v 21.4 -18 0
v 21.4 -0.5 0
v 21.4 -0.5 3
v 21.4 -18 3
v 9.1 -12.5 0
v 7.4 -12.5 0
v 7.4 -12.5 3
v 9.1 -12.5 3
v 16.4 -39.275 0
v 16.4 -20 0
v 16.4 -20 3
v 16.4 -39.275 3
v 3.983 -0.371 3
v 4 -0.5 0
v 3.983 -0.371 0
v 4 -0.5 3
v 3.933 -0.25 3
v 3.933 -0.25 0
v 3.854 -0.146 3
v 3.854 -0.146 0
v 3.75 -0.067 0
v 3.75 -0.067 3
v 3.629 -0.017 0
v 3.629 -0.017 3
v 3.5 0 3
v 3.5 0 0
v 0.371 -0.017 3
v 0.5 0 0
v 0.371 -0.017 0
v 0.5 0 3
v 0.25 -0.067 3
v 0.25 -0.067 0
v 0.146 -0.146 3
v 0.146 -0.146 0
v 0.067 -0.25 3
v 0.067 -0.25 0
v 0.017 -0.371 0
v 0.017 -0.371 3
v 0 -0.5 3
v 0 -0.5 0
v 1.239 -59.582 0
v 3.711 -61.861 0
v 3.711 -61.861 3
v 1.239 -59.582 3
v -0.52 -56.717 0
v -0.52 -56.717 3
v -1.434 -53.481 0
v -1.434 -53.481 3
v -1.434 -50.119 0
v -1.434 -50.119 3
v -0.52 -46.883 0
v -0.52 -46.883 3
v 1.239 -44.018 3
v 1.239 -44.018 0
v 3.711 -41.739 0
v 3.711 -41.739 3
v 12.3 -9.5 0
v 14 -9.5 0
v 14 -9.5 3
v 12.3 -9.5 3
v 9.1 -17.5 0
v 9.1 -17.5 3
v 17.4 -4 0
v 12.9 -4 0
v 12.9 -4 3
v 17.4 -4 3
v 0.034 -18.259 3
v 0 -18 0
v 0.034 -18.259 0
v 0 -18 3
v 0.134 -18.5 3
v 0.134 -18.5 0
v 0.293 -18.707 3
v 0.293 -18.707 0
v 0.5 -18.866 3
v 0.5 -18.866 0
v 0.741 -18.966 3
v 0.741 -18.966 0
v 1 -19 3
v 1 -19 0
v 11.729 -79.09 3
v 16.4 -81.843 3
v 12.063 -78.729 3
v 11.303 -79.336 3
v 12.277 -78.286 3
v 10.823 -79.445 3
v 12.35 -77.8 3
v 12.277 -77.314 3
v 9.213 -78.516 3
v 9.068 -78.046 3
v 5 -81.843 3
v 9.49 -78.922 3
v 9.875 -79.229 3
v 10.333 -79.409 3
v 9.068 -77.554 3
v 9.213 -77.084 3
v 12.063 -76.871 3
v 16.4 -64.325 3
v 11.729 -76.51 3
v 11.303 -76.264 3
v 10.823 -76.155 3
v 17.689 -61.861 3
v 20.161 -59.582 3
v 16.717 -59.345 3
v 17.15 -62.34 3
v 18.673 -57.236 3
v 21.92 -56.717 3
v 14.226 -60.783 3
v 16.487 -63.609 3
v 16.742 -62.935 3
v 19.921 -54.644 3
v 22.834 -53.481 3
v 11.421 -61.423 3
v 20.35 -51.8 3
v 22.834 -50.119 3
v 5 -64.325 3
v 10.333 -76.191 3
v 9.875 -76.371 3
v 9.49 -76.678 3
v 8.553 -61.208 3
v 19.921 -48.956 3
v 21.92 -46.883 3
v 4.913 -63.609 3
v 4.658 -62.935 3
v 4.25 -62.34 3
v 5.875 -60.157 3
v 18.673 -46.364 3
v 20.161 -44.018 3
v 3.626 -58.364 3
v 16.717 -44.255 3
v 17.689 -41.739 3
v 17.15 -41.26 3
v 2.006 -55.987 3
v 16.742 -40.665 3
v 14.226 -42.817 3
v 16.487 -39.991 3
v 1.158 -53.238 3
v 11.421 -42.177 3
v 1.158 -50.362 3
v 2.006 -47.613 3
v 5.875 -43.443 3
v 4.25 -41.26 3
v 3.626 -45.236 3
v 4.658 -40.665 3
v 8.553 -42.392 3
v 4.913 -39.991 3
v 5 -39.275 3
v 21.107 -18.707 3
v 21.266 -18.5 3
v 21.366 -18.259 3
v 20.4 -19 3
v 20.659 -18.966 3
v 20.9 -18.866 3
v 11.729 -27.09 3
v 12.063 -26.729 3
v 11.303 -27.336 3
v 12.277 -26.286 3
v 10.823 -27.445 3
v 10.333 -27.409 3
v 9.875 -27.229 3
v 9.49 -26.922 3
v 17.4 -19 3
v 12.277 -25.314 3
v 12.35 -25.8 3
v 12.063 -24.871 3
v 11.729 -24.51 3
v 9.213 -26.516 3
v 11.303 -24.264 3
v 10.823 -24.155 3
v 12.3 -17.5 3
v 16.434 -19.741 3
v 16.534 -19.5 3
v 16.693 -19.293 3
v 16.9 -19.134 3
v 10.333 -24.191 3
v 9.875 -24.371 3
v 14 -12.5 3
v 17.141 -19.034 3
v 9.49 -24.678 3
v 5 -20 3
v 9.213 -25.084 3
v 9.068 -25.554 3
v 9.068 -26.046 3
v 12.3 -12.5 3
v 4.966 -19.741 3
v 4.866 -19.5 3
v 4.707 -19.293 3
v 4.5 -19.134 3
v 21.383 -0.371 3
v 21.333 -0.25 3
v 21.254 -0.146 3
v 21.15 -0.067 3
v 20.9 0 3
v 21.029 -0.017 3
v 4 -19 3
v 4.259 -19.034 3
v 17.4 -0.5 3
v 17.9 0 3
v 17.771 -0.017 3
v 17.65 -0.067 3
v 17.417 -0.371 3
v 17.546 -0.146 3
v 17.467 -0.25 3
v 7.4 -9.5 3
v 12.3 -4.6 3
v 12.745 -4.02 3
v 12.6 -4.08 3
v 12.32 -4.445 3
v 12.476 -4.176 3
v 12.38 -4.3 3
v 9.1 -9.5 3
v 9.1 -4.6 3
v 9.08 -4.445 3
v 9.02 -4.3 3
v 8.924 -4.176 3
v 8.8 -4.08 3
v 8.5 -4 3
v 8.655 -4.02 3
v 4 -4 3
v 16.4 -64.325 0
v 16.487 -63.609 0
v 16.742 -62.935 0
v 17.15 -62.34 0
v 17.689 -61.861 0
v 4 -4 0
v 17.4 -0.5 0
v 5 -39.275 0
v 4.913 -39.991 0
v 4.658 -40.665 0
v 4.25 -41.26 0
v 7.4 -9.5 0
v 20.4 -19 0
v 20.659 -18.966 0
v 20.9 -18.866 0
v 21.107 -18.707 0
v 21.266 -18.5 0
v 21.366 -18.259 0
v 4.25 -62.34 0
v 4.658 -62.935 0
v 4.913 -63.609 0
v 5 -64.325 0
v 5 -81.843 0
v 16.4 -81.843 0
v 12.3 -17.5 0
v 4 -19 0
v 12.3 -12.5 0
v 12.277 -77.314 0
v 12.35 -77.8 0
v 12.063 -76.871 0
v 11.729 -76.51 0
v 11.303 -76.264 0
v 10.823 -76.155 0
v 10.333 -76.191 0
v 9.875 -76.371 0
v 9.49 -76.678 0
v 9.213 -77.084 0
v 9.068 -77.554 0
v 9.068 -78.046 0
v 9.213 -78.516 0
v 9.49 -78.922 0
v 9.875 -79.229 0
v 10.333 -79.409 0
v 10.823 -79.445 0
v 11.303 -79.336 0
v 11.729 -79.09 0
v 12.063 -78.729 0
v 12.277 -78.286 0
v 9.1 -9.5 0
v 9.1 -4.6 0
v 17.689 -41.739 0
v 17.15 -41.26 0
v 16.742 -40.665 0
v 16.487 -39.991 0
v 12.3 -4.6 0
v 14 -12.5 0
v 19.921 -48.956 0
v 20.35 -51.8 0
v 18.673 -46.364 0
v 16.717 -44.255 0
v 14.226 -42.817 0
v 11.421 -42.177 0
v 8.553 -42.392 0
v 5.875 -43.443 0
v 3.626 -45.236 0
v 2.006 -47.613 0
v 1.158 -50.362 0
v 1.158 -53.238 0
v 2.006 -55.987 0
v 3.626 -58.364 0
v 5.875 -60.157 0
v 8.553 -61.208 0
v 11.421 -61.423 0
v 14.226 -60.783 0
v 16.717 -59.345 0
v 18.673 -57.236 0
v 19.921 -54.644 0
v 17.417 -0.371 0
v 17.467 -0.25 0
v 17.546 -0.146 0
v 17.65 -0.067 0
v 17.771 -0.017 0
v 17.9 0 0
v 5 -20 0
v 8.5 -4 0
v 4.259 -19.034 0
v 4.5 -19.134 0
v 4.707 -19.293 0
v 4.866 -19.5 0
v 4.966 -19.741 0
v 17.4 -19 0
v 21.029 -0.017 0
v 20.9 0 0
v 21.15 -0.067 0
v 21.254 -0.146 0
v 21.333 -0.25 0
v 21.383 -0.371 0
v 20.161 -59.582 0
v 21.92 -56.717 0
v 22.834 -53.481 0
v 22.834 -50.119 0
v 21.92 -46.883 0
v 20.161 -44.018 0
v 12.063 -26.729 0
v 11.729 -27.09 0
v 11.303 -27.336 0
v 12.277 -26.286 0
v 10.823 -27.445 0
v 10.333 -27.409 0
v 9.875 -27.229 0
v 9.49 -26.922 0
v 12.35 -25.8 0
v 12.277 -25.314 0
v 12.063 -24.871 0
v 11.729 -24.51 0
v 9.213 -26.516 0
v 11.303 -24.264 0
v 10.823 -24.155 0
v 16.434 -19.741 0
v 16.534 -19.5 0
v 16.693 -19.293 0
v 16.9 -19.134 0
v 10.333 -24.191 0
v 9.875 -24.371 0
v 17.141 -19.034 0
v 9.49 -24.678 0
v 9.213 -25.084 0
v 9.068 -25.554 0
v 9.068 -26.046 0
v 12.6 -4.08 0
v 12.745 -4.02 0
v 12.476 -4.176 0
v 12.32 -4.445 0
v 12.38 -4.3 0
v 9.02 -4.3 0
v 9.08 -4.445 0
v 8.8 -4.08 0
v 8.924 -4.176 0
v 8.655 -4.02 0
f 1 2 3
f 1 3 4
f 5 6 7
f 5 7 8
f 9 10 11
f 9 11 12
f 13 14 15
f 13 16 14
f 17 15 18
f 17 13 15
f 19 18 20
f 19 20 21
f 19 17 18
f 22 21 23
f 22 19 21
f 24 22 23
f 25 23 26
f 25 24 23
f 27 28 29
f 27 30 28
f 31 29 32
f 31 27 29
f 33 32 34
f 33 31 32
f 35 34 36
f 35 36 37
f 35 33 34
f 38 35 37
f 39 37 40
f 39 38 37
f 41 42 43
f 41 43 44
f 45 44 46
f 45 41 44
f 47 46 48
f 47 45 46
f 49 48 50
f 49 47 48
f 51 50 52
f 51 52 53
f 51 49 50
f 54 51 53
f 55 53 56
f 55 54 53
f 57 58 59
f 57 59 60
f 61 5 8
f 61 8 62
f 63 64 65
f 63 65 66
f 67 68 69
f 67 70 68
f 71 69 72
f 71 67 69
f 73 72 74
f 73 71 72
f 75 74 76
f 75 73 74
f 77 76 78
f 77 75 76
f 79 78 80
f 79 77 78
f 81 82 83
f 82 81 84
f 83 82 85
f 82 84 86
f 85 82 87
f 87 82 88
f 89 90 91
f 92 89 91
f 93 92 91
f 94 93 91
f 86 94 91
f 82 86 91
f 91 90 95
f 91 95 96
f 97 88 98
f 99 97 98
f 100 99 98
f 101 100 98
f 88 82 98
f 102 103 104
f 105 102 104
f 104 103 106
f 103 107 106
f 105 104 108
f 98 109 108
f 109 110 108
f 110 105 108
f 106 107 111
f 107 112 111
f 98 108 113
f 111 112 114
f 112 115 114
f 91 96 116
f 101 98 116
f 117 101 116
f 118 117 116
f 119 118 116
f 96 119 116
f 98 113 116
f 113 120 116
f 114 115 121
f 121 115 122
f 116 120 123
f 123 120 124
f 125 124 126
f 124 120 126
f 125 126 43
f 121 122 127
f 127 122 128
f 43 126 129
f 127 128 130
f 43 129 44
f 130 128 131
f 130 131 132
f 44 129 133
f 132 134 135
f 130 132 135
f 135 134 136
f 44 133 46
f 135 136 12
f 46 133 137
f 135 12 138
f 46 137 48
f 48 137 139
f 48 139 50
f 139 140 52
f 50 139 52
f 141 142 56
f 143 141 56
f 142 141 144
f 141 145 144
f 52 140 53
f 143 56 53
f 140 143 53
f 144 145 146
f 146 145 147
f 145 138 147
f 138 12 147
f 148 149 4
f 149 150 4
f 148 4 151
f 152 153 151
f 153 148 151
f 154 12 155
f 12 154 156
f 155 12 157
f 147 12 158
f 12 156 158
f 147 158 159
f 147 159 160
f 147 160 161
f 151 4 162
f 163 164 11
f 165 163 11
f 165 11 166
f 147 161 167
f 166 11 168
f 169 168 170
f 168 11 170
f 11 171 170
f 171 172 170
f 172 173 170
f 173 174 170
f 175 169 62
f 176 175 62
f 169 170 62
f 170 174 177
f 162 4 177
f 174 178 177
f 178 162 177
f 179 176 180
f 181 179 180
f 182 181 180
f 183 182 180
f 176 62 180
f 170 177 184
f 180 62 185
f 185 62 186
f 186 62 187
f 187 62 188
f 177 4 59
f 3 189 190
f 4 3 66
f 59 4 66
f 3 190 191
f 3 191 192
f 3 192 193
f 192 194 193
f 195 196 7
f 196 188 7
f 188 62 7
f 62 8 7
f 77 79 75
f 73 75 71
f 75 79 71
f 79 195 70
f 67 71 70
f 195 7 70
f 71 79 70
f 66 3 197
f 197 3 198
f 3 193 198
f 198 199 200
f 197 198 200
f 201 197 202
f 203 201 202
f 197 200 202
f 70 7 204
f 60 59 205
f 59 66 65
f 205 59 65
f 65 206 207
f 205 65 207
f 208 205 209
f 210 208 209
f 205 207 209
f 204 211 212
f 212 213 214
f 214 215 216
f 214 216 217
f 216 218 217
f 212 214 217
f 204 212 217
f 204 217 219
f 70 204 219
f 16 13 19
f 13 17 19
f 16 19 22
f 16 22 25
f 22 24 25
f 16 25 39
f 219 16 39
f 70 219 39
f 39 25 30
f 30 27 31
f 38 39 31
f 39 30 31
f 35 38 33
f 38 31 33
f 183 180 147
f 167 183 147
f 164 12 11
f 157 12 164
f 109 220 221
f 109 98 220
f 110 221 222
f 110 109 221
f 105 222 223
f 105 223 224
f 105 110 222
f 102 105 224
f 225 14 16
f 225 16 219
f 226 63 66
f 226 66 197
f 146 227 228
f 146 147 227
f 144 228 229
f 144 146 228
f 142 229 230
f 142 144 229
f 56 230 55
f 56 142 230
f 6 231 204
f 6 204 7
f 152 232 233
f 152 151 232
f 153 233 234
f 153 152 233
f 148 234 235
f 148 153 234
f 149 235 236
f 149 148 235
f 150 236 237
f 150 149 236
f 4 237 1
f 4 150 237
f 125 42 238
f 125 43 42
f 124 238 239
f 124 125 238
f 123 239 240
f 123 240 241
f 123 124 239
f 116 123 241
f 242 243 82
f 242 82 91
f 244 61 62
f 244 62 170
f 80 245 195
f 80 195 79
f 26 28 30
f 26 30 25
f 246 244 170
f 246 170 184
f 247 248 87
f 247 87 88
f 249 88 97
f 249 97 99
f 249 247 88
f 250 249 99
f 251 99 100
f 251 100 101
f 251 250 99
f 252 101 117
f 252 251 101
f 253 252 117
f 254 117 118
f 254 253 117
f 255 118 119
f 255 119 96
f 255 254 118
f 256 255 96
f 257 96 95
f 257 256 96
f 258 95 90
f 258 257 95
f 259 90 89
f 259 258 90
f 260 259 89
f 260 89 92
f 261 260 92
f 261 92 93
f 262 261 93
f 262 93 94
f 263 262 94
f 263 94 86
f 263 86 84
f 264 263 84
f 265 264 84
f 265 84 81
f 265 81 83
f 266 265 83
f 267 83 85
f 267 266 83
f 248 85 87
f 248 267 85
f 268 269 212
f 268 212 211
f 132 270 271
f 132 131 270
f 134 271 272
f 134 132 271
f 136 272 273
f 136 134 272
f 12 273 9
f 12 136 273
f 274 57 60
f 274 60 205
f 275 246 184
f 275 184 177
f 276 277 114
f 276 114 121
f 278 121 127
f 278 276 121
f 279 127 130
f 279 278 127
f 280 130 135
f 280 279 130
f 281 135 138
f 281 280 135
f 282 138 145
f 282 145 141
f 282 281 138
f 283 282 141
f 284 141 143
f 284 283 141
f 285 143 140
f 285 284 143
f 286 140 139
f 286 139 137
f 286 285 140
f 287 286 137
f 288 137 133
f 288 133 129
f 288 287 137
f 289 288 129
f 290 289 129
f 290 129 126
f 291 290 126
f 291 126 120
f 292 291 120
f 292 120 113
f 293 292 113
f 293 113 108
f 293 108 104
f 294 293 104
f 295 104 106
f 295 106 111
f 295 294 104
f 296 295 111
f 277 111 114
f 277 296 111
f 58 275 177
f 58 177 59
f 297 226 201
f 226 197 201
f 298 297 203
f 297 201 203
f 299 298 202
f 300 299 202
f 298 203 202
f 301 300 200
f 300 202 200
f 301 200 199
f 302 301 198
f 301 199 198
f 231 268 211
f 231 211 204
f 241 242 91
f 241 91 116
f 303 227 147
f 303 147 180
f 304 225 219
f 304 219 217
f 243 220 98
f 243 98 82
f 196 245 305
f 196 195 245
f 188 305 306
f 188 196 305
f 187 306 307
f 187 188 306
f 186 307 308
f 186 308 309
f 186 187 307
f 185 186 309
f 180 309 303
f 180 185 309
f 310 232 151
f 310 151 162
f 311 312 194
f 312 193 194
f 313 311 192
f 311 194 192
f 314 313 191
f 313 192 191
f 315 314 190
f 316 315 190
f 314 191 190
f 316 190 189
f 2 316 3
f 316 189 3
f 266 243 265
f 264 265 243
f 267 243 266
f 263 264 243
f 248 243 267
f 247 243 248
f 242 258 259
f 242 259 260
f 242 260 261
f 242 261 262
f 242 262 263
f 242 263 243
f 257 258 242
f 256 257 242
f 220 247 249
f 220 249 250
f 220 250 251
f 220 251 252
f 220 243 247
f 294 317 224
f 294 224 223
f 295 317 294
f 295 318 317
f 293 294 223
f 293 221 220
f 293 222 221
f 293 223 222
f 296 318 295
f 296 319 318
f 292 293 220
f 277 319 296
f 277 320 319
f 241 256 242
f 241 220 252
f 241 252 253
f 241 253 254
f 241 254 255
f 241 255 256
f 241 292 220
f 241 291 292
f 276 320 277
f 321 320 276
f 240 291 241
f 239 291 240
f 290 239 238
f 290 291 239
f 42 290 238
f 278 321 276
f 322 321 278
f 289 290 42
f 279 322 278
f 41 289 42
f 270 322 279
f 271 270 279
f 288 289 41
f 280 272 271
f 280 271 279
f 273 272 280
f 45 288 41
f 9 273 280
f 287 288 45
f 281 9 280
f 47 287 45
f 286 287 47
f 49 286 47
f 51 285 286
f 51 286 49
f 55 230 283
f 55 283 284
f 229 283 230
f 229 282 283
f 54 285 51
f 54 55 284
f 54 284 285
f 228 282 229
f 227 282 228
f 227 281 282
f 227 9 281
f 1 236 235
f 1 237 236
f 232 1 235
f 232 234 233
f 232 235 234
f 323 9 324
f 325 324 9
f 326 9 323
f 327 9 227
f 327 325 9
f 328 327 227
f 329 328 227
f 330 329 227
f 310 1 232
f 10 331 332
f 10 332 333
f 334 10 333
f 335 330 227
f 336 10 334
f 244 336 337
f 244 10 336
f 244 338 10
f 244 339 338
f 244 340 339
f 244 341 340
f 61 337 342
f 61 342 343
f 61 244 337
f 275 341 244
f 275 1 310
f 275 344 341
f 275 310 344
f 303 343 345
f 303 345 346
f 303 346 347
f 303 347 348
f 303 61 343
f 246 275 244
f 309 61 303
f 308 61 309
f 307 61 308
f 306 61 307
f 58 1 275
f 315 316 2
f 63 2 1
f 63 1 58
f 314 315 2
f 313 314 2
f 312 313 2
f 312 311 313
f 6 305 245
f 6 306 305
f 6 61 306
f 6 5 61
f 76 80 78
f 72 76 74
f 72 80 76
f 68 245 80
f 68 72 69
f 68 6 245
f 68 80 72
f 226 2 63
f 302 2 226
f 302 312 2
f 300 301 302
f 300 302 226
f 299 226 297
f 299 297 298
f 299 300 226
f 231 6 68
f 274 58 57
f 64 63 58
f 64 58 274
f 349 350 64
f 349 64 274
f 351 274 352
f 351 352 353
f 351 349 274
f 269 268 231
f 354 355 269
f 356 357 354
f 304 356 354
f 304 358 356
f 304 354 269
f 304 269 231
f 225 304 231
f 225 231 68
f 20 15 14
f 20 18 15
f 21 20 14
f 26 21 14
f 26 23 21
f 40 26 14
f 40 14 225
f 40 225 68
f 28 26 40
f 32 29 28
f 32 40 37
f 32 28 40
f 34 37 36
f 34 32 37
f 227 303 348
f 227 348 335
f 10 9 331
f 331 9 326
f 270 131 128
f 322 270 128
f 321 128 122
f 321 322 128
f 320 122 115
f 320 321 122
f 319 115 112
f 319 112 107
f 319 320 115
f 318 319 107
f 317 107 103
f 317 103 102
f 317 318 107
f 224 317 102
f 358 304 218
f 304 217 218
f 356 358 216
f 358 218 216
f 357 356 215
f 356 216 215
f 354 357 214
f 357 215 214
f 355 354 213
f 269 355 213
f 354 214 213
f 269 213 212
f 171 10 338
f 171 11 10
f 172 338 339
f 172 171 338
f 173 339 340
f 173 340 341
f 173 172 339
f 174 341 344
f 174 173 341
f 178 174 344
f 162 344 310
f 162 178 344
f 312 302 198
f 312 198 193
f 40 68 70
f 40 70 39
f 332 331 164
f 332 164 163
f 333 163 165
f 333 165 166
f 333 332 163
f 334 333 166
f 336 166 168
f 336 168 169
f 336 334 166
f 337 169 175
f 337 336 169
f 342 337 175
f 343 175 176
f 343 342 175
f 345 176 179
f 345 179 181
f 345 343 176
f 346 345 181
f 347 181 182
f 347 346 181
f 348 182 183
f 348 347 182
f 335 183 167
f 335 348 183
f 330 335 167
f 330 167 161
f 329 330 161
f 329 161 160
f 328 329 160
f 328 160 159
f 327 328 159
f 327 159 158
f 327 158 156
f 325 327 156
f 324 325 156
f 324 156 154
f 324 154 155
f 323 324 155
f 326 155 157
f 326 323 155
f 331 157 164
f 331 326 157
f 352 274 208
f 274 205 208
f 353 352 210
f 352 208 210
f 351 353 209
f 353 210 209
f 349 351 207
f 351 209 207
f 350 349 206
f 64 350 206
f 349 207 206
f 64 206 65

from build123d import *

# Parameters (mm, degrees)
SKETCH_1_R      = 9.65
SKETCH_1_R_2    = 1.65
EXTRUDE_1_DEPTH = 3
FILLET_2_R      = 1
FILLET_3_R      = 0.6
FILLET_4_R      = 0.5
FILLET_5_R      = 3


with BuildPart() as part:
    # 草图1 → 凸台-拉伸1 (new body)
    with BuildSketch(Plane.XY):
        with BuildLine():
            Line((0, 0), (4, 0))
            Line((4, 0), (4, -4))
            Line((4, -4), (9.1, -4))
            Line((9.1, -4), (9.1, -9.5))
            Line((9.1, -9.5), (7.4, -9.5))
            Line((7.4, -9.5), (7.4, -12.5))
            Line((7.4, -12.5), (9.1, -12.5))
            Line((9.1, -12.5), (9.1, -17.5))
            Line((9.1, -17.5), (12.3, -17.5))
            Line((12.3, -17.5), (12.3, -12.5))
            Line((12.3, -12.5), (14, -12.5))
            Line((14, -12.5), (14, -9.5))
            Line((14, -9.5), (12.3, -9.5))
            Line((12.3, -9.5), (12.3, -4))
            Line((12.3, -4), (17.4, -4))
            Line((17.4, -4), (17.4, 0))
            Line((17.4, 0), (21.4, 0))
            Line((21.4, 0), (21.4, -4))
            Line((21.4, -4), (21.4, -19))
            Line((21.4, -19), (16.4, -19))
            Line((16.4, -19), (16.4, -40.956914646))
            ThreePointArc((16.4, -40.956914646), (22.95, -51.8), (16.4, -62.643085354))
            Line((16.4, -62.643085354), (16.4, -81.843085354))
            Line((16.4, -81.843085354), (5, -81.843085354))
            Line((5, -81.843085354), (5, -62.643085354))
            ThreePointArc((5, -62.643085354), (-1.55, -51.8), (5, -40.956914646))
            Line((5, -40.956914646), (5, -19))
            Line((5, -19), (0, -19))
            Line((0, -19), (0, -4))
            Line((0, -4), (0, 0))
        make_face()
        with Locations((10.7, -51.8)):
            Circle(SKETCH_1_R, mode=Mode.SUBTRACT)
        with Locations((10.7, -25.8)):
            Circle(SKETCH_1_R_2, mode=Mode.SUBTRACT)
        with Locations((10.7, -77.8)):
            Circle(SKETCH_1_R_2, mode=Mode.SUBTRACT)
    extrude(amount=EXTRUDE_1_DEPTH)

    # 圆角2
    fillet_2_edges = [part.edges().sort_by_distance(p)[0] for p in [
        (21.4, -19, 1.5),
        (16.4, -19, 1.5),
        (5, -19, 1.5),
        (0, -19, 1.5),
    ]]
    fillet(fillet_2_edges, radius=FILLET_2_R)

    # 圆角3
    fillet_3_edges = [part.edges().sort_by_distance(p)[0] for p in [
        (9.1, -4, 1.5),
        (12.3, -4, 1.5),
    ]]
    fillet(fillet_3_edges, radius=FILLET_3_R)

    # 圆角4
    fillet_4_edges = [part.edges().sort_by_distance(p)[0] for p in [
        (0, 0, 1.5),
        (4, 0, 1.5),
        (17.4, 0, 1.5),
        (21.4, 0, 1.5),
    ]]
    fillet(fillet_4_edges, radius=FILLET_4_R)

    # 圆角5
    fillet_5_edges = [part.edges().sort_by_distance(p)[0] for p in [
        (16.4, -40.956914646, 1.5),
        (16.4, -62.643085354, 1.5),
        (5, -62.643085354, 1.5),
        (5, -40.956914646, 1.5),
    ]]
    fillet(fillet_5_edges, radius=FILLET_5_R)


solid = part.part
